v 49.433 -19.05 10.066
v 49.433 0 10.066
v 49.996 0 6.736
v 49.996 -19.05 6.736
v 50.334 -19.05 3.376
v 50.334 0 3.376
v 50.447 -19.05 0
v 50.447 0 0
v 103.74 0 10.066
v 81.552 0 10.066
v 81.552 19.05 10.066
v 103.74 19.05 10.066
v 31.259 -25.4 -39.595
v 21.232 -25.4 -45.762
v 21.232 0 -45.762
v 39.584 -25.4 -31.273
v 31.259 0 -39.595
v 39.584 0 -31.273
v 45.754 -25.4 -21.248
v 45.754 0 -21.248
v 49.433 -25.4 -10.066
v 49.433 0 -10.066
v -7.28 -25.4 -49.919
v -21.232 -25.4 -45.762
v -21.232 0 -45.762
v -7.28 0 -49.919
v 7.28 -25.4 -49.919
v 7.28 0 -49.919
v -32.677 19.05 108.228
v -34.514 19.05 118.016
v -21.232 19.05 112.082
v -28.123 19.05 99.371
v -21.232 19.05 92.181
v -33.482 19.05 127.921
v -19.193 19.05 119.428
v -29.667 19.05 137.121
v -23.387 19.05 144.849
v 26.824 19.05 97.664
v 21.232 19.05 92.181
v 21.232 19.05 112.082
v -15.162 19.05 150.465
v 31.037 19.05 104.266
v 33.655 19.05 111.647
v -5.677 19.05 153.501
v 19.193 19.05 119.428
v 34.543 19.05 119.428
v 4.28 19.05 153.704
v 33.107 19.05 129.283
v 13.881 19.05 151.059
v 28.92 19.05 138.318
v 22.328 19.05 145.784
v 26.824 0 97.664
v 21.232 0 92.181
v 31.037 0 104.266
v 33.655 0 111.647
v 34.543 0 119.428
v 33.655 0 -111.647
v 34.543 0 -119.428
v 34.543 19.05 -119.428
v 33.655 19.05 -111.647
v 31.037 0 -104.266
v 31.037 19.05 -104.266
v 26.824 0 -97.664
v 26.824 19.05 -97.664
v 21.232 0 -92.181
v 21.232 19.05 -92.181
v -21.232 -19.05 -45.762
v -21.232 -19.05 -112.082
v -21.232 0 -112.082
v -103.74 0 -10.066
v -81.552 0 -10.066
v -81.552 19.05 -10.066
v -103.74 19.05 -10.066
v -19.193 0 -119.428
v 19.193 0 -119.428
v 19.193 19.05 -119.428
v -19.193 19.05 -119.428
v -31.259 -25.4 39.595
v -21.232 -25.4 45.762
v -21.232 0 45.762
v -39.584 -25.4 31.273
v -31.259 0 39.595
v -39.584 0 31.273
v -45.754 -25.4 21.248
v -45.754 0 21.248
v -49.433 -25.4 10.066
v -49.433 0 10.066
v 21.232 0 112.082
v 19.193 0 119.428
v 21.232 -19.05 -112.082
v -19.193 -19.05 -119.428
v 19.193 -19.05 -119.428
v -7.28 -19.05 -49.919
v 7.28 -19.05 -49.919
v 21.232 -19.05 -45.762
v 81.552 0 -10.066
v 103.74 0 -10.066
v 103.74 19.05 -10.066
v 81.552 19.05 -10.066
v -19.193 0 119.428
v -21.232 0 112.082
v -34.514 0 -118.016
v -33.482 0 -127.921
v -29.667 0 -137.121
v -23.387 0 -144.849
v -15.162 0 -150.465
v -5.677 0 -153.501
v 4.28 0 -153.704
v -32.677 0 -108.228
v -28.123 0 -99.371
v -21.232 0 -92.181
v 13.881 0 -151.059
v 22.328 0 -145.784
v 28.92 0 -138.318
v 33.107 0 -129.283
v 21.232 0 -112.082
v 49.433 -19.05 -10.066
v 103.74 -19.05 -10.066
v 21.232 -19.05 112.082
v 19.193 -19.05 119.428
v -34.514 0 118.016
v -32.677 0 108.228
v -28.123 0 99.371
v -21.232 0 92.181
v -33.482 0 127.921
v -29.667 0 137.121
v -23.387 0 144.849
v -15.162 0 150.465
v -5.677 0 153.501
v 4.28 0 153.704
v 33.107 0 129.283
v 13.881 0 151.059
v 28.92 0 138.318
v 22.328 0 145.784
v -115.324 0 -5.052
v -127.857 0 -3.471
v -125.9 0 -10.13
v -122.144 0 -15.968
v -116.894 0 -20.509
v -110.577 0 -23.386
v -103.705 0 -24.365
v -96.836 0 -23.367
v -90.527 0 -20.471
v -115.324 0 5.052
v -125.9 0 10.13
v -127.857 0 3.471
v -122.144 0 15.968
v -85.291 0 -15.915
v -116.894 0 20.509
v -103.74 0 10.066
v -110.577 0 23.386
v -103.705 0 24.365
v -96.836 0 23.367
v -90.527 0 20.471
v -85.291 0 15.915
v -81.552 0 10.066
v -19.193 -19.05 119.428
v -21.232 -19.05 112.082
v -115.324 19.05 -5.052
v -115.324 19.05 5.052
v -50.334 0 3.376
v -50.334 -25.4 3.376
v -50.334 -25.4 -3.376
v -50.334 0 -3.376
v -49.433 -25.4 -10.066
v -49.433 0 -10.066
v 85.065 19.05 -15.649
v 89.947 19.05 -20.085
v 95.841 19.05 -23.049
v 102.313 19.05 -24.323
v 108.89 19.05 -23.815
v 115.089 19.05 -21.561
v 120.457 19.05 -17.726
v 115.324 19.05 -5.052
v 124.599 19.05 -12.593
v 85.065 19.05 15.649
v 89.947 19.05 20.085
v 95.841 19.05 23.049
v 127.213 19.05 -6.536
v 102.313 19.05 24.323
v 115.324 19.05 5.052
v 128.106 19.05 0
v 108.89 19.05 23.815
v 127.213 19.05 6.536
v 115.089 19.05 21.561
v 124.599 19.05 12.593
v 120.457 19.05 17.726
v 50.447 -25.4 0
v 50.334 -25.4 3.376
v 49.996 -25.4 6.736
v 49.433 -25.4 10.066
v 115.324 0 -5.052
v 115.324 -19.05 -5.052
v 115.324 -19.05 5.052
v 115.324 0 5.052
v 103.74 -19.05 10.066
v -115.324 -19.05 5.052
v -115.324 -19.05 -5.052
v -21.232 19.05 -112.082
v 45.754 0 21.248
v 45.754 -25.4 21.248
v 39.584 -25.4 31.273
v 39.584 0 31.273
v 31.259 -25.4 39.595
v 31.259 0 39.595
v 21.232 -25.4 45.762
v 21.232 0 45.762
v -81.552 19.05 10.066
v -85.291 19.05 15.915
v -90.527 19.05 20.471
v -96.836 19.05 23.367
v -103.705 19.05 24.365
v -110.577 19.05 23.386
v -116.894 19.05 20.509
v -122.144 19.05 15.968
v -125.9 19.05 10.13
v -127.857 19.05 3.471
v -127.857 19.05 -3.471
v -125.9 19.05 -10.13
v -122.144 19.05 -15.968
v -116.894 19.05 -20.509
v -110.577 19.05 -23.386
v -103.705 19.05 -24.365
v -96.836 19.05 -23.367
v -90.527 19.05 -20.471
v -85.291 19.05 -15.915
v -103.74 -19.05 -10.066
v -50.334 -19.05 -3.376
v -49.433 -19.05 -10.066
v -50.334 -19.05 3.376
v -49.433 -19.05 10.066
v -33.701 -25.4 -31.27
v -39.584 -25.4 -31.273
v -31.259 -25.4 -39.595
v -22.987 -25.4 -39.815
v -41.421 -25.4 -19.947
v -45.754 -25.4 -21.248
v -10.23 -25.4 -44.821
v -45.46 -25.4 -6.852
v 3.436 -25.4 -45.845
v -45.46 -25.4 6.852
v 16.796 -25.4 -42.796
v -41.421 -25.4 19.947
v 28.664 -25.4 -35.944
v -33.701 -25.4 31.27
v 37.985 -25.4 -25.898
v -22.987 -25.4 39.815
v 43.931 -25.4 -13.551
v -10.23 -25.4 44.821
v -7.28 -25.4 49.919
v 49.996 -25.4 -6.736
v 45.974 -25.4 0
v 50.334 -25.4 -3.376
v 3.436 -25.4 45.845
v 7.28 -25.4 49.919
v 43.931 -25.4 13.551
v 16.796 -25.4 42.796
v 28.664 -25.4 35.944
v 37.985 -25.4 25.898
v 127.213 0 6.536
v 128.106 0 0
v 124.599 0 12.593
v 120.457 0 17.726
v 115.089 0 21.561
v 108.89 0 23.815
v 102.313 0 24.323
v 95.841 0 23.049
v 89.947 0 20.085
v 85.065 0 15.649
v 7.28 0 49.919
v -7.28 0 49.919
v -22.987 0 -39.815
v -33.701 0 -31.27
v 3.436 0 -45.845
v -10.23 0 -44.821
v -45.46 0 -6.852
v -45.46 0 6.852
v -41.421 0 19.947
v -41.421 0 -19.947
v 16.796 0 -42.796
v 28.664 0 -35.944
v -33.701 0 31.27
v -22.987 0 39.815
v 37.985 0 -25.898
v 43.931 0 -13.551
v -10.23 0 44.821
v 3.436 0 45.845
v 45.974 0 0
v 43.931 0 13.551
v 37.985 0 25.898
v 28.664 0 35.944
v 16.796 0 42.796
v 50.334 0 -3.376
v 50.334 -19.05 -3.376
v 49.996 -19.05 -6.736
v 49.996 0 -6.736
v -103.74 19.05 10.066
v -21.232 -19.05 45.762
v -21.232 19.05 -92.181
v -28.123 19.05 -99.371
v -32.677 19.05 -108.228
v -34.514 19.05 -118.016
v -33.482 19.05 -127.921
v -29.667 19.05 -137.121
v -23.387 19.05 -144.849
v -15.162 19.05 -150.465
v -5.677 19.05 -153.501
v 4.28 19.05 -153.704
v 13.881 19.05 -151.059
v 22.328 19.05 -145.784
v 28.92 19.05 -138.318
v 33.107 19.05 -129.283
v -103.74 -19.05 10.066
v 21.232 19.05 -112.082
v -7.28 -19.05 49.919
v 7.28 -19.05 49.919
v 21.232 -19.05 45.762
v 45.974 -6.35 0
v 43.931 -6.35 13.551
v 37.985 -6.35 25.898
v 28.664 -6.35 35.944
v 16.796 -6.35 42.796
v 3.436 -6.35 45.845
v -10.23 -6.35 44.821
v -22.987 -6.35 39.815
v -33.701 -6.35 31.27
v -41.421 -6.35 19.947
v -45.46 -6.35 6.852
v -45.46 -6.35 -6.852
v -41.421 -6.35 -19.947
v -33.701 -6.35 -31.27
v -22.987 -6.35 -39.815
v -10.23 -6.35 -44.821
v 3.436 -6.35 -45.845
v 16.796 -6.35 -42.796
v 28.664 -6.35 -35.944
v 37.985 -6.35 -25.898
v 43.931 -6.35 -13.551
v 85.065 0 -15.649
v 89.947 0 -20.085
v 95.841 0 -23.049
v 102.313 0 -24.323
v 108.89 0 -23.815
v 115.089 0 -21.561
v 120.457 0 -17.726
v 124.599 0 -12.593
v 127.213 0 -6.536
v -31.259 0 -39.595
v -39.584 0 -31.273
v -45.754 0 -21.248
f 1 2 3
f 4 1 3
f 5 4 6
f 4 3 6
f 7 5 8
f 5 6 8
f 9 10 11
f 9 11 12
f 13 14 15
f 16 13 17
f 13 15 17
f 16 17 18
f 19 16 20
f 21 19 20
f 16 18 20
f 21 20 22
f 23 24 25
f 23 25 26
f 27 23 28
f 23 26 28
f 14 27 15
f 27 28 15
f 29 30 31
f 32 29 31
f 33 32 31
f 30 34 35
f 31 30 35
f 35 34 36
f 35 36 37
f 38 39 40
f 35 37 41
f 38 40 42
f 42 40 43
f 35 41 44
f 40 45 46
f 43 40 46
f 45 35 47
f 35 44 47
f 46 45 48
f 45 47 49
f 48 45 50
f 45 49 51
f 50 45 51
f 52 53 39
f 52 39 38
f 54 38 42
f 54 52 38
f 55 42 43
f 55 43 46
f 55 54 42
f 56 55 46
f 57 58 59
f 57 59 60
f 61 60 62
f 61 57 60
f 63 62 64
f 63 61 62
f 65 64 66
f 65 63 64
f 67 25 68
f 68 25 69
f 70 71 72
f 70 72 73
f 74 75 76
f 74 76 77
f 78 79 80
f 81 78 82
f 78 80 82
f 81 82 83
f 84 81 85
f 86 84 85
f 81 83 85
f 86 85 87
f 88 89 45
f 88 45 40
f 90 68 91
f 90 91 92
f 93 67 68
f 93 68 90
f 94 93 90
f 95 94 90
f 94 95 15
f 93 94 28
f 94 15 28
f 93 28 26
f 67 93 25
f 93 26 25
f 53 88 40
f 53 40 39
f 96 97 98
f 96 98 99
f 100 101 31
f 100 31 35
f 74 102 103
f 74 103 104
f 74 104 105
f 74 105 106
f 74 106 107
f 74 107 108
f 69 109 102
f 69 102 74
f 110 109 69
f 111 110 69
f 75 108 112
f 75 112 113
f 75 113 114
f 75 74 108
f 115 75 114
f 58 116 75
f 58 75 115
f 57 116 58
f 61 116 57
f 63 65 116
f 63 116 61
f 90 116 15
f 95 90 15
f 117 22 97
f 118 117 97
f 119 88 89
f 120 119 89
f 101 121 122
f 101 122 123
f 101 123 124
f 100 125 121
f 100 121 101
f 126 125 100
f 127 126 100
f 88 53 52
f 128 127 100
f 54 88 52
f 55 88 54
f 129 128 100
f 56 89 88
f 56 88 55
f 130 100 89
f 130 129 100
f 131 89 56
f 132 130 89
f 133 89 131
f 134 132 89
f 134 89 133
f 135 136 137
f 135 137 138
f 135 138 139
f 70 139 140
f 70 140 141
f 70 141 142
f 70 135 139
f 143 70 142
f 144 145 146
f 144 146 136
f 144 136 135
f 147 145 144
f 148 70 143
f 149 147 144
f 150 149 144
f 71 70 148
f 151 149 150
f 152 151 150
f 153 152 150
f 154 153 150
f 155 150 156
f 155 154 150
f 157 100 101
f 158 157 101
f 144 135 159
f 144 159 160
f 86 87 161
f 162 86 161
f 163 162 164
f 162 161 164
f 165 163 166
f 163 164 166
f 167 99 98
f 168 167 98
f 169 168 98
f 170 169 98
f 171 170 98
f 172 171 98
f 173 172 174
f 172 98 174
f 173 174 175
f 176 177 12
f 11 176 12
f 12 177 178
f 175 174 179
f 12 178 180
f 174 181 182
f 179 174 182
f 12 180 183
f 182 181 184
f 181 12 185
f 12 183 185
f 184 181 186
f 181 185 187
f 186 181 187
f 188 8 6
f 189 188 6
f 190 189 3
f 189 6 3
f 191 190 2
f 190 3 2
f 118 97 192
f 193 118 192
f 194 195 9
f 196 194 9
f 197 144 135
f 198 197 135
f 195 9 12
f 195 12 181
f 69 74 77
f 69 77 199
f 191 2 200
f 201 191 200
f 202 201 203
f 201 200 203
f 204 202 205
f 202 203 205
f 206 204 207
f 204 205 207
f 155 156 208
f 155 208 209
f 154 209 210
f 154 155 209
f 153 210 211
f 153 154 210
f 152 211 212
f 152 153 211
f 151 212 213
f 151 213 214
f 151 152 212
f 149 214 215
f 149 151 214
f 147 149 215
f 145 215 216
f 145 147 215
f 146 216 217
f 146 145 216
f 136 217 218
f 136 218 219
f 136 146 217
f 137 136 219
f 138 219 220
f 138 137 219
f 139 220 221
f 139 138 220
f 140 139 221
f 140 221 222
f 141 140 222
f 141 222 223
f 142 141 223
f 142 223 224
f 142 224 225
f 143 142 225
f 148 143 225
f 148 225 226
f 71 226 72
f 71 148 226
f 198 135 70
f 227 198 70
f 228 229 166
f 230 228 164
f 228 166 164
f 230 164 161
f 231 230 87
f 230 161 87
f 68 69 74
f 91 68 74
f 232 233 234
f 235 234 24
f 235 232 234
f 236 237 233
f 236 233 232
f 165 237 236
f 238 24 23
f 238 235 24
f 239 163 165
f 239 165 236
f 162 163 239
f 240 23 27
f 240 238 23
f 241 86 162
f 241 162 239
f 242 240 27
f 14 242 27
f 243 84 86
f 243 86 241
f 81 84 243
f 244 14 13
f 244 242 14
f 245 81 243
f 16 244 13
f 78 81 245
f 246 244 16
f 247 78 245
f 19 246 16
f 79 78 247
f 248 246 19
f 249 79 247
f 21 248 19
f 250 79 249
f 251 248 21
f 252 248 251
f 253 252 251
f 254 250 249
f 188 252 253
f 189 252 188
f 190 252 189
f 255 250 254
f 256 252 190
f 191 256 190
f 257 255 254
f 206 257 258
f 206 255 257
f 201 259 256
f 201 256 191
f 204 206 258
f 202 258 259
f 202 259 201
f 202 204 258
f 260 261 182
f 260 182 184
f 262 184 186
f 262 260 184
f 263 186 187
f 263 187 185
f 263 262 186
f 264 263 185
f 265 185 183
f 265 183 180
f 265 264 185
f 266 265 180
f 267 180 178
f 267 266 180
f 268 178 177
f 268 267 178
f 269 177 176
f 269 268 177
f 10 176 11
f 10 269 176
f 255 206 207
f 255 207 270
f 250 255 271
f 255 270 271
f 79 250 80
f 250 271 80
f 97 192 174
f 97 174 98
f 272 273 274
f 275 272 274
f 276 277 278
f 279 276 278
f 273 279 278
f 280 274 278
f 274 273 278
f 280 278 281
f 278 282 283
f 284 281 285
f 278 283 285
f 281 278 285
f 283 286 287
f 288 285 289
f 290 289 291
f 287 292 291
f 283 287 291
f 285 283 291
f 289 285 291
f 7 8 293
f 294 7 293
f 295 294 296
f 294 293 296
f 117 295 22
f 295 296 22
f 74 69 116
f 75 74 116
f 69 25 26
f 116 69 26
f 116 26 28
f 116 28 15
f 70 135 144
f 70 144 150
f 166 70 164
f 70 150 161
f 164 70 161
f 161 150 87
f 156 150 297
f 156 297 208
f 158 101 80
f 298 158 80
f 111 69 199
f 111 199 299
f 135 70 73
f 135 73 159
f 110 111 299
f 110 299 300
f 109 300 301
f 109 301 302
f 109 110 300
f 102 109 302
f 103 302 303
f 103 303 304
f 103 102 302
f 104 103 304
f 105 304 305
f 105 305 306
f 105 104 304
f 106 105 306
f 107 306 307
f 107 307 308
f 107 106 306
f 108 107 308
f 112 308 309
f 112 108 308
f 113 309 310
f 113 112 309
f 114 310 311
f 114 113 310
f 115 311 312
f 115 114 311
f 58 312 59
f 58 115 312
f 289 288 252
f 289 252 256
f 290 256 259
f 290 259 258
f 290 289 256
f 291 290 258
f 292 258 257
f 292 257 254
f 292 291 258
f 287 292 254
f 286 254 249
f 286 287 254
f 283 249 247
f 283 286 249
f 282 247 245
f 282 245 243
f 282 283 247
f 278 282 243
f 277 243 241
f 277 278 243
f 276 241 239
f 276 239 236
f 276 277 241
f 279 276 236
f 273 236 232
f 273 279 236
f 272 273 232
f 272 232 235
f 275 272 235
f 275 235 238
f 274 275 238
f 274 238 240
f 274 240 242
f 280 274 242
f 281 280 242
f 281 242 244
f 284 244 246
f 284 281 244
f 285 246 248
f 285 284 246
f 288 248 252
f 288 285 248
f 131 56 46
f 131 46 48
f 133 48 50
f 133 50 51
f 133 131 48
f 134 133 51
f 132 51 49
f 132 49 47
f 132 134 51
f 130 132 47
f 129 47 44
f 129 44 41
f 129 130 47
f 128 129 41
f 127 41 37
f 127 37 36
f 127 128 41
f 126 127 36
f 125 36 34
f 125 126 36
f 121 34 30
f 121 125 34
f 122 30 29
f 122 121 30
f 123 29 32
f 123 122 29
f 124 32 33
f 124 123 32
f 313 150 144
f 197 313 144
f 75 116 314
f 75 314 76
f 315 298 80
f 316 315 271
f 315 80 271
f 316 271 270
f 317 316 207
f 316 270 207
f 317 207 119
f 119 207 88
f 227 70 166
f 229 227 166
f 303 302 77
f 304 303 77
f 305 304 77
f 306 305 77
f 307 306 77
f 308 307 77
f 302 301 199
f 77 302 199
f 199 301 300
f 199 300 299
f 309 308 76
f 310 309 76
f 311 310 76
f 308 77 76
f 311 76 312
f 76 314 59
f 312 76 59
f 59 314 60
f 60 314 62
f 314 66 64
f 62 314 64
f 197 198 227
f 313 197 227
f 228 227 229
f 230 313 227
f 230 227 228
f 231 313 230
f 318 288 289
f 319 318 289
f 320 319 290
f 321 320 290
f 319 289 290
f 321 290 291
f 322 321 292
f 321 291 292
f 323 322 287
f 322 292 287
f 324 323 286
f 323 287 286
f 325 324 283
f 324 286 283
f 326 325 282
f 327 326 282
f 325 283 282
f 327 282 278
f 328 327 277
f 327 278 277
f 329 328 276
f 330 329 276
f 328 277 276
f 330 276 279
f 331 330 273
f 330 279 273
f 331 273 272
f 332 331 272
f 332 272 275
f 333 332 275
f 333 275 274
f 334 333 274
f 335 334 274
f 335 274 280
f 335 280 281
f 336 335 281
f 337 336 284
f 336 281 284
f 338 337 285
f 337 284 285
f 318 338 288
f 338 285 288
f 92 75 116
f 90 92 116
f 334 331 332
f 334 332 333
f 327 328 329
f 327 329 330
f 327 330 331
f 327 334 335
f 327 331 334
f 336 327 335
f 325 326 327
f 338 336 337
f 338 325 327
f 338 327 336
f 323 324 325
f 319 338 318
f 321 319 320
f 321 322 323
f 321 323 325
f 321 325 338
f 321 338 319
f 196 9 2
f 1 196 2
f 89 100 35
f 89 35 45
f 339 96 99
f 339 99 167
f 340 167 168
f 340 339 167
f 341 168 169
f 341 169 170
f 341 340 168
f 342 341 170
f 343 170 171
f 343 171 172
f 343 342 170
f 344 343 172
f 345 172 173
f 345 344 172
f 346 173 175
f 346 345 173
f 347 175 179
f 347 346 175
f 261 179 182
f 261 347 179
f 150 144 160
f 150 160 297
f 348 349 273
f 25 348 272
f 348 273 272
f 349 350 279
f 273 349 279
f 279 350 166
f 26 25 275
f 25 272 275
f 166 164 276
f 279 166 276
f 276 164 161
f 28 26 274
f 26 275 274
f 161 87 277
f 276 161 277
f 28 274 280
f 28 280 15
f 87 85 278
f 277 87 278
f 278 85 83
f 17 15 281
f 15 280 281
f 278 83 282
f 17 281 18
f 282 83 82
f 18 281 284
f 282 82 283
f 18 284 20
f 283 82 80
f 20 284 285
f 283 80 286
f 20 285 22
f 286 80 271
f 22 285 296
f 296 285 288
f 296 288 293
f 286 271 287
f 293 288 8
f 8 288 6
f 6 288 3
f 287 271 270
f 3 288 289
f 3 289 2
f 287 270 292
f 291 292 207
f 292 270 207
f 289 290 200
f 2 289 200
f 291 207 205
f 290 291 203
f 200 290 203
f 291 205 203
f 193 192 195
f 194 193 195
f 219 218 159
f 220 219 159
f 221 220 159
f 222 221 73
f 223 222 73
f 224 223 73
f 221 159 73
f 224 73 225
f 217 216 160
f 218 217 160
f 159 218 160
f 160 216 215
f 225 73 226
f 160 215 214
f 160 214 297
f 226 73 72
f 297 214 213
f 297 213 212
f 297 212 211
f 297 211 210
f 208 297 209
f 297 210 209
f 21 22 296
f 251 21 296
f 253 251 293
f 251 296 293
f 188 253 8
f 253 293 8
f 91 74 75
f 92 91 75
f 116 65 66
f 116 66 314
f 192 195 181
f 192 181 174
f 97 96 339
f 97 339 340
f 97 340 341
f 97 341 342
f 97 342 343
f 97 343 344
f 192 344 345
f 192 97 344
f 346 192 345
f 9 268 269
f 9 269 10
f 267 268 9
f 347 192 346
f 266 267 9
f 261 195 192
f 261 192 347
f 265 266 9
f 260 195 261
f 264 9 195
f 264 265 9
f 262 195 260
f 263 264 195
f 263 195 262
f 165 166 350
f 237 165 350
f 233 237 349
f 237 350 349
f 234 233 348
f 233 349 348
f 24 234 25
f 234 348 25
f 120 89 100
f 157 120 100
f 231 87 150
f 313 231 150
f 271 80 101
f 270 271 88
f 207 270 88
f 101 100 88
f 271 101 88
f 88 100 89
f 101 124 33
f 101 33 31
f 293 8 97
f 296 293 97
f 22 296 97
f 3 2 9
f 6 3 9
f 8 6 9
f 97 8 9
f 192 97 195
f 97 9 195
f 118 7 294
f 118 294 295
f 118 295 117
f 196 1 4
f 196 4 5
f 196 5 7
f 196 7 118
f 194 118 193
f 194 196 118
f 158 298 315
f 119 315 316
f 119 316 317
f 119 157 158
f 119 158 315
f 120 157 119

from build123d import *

# Parameters (mm, degrees)
F0_R     = 45.9739525872
F1_DEPTH = 6.35
F2_DEPTH = 25.4
F3_DEPTH = 19.05
F4_DEPTH = 19.05


with BuildPart() as f1:
    # F0 (on Front) → F1 (new body)
    with BuildSketch(Plane.XZ):
        Circle(F0_R)
    extrude(amount=F1_DEPTH)


with BuildPart() as f2:
    # F0 (on Front) → F2 (new body)
    with BuildSketch(Plane.XZ):
        with BuildLine():
            ThreePointArc((49.4328212787, -10.0663737277), (50.1930812917, -5.0586846158), (50.4473557245, 0))
            ThreePointArc((50.4473557245, 0), (50.1930812917, 5.0586846158), (49.4328212787, 10.0663737277))
            ThreePointArc((49.4328212787, 10.0663737277), (39.5844821809, 31.2730630106), (21.2324433808, 45.7615455124))
            ThreePointArc((21.2324433808, 45.7615455124), (0, 50.4473557245), (-21.2324433808, 45.7615455124))
            ThreePointArc((-21.2324433808, 45.7615455124), (-39.5844821809, 31.2730630106), (-49.4328212787, 10.0663737277))
            ThreePointArc((-49.4328212787, 10.0663737277), (-50.4473557245, 0), (-49.4328212787, -10.0663737277))
            ThreePointArc((-49.4328212787, -10.0663737277), (-39.5844821809, -31.2730630106), (-21.2324433808, -45.7615455124))
            ThreePointArc((-21.2324433808, -45.7615455124), (0, -50.4473557245), (21.2324433808, -45.7615455124))
            ThreePointArc((21.2324433808, -45.7615455124), (39.5844821809, -31.2730630106), (49.4328212787, -10.0663737277))
        make_face()
        Circle(F0_R, mode=Mode.SUBTRACT)
    extrude(amount=F2_DEPTH)


with BuildPart() as f3:
    # F0 (on Front) → F3 (new body)
    with BuildSketch(Plane.XZ):
        with BuildLine():
            ThreePointArc((-79.3750054435, 0), (-79.9253862812, 5.1495078004), (-81.5516639655, 10.0663737277))
            Line((-81.5516639655, 10.0663737277), (-103.7402702002, 10.0663737277))
            Line((-103.7402702002, 10.0663737277), (-115.3241221478, 5.0522867017))
            Line((-115.3241221478, 5.0522867017), (-115.3241221478, -5.0522867017))
            Line((-115.3241221478, -5.0522867017), (-103.7402702002, -10.0663737277))
            Line((-103.7402702002, -10.0663737277), (-81.5516639655, -10.0663737277))
            ThreePointArc((-81.5516639655, -10.0663737277), (-79.9253862812, -5.1495078004), (-79.3750054435, 0))
        make_face()
        with BuildLine():
            ThreePointArc((-49.4328212787, -10.0663737277), (-50.4473557245, 0), (-49.4328212787, 10.0663737277))
            Line((-49.4328212787, 10.0663737277), (-81.5516639655, 10.0663737277))
            ThreePointArc((-81.5516639655, 10.0663737277), (-79.9253862812, 5.1495078004), (-79.3750054435, 0))
            ThreePointArc((-79.3750054435, 0), (-79.9253862812, -5.1495078004), (-81.5516639655, -10.0663737277))
            Line((-81.5516639655, -10.0663737277), (-49.4328212787, -10.0663737277))
        make_face()
    extrude(amount=F3_DEPTH)


with BuildPart() as f3b:
    # F0 (on Front) → F3, piece 2 (new body)
    with BuildSketch(Plane.XZ):
        with BuildLine():
            ThreePointArc((49.4328212787, 10.0663737277), (50.1930812917, 5.0586846158), (50.4473557245, 0))
            ThreePointArc((50.4473557245, 0), (50.1930812917, -5.0586846158), (49.4328212787, -10.0663737277))
            Line((49.4328212787, -10.0663737277), (81.5516639655, -10.0663737277))
            ThreePointArc((81.5516639655, -10.0663737277), (79.3750054435, 0), (81.5516639655, 10.0663737277))
            Line((81.5516639655, 10.0663737277), (49.4328212787, 10.0663737277))
        make_face()
        with BuildLine():
            Line((103.7402702002, 10.0663737277), (81.5516639655, 10.0663737277))
            ThreePointArc((81.5516639655, 10.0663737277), (79.3750054435, 0), (81.5516639655, -10.0663737277))
            Line((81.5516639655, -10.0663737277), (103.7402702002, -10.0663737277))
            Line((103.7402702002, -10.0663737277), (115.3241221478, -5.0522867017))
            Line((115.3241221478, -5.0522867017), (115.3241221478, 5.0522867017))
            Line((115.3241221478, 5.0522867017), (103.7402702002, 10.0663737277))
        make_face()
    extrude(amount=F3_DEPTH)


with BuildPart() as f3c:
    # F0 (on Front) → F3, piece 3 (new body)
    with BuildSketch(Plane.XZ):
        with BuildLine():
            ThreePointArc((-21.2324433808, 45.7615455124), (0, 50.4473557245), (21.2324433808, 45.7615455124))
            Line((21.2324433808, 45.7615455124), (21.2324433808, 92.1809940965))
            ThreePointArc((21.2324433808, 92.1809940965), (0, 84.8849892461), (-21.2324433808, 92.1809940965))
            Line((-21.2324433808, 92.1809940965), (-21.2324433808, 45.7615455124))
        make_face()
        with BuildLine():
            ThreePointArc((-21.2324433808, 92.1809940965), (0, 84.8849892461), (21.2324433808, 92.1809940965))
            Line((21.2324433808, 92.1809940965), (21.2324433808, 112.0817683699))
            Line((21.2324433808, 112.0817683699), (19.1925481176, 119.4277526507))
            Line((19.1925481176, 119.4277526507), (0, 119.4277526507))
            Line((0, 119.4277526507), (-19.1925481176, 119.4277526507))
            Line((-19.1925481176, 119.4277526507), (-21.2324433808, 112.0817683699))
            Line((-21.2324433808, 112.0817683699), (-21.2324433808, 92.1809940965))
        make_face()
    extrude(amount=F3_DEPTH)


with BuildPart() as f3d:
    # F0 (on Front) → F3, piece 4 (new body)
    with BuildSketch(Plane.XZ):
        with BuildLine():
            Line((21.2324433808, -92.1809940965), (21.2324433808, -45.7615455124))
            ThreePointArc((21.2324433808, -45.7615455124), (0, -50.4473557245), (-21.2324433808, -45.7615455124))
            Line((-21.2324433808, -45.7615455124), (-21.2324433808, -92.1809940965))
            ThreePointArc((-21.2324433808, -92.1809940965), (0, -84.8849892461), (21.2324433808, -92.1809940965))
        make_face()
        with BuildLine():
            Line((21.2324433808, -112.0817683699), (21.2324433808, -92.1809940965))
            ThreePointArc((21.2324433808, -92.1809940965), (0, -84.8849892461), (-21.2324433808, -92.1809940965))
            Line((-21.2324433808, -92.1809940965), (-21.2324433808, -112.0817683699))
            Line((-21.2324433808, -112.0817683699), (-19.1925481176, -119.4277526507))
            Line((-19.1925481176, -119.4277526507), (0, -119.4277526507))
            Line((0, -119.4277526507), (19.1925481176, -119.4277526507))
            Line((19.1925481176, -119.4277526507), (21.2324433808, -112.0817683699))
        make_face()
    extrude(amount=F3_DEPTH)


with BuildPart() as f4:
    # F0 (on Front) → F4 (new body)
    with BuildSketch(Plane.XZ):
        with BuildLine():
            Line((21.2324433808, 112.0817683699), (21.2324433808, 92.1809940965))
            ThreePointArc((21.2324433808, 92.1809940965), (31.0373144121, 104.2657073496), (34.5427634046, 119.4277526507))
            ThreePointArc((34.5427634046, 119.4277526507), (-15.1620453011, 150.4650670629), (-21.2324433808, 92.1809940965))
            Line((-21.2324433808, 92.1809940965), (-21.2324433808, 112.0817683699))
            Line((-21.2324433808, 112.0817683699), (-19.1925481176, 119.4277526507))
            Line((-19.1925481176, 119.4277526507), (0, 119.4277526507))
            Line((0, 119.4277526507), (19.1925481176, 119.4277526507))
            Line((19.1925481176, 119.4277526507), (21.2324433808, 112.0817683699))
        make_face()
    extrude(amount=-F4_DEPTH)


with BuildPart() as f4b:
    # F0 (on Front) → F4, piece 2 (new body)
    with BuildSketch(Plane.XZ):
        with BuildLine():
            ThreePointArc((34.5427634046, -119.4277526507), (31.0373144121, -104.2657073496), (21.2324433808, -92.1809940965))
            Line((21.2324433808, -92.1809940965), (21.2324433808, -112.0817683699))
            Line((21.2324433808, -112.0817683699), (19.1925481176, -119.4277526507))
            Line((19.1925481176, -119.4277526507), (0, -119.4277526507))
            Line((0, -119.4277526507), (-19.1925481176, -119.4277526507))
            Line((-19.1925481176, -119.4277526507), (-21.2324433808, -112.0817683699))
            Line((-21.2324433808, -112.0817683699), (-21.2324433808, -92.1809940965))
            ThreePointArc((-21.2324433808, -92.1809940965), (-15.1620453011, -150.4650670629), (34.5427634046, -119.4277526507))
        make_face()
    extrude(amount=-F4_DEPTH)


with BuildPart() as f4c:
    # F0 (on Front) → F4, piece 3 (new body)
    with BuildSketch(Plane.XZ):
        with BuildLine():
            Line((-103.7402702002, 10.0663737277), (-81.5516639655, 10.0663737277))
            ThreePointArc((-81.5516639655, 10.0663737277), (-128.1055349569, 0), (-81.5516639655, -10.0663737277))
            Line((-81.5516639655, -10.0663737277), (-103.7402702002, -10.0663737277))
            Line((-103.7402702002, -10.0663737277), (-115.3241221478, -5.0522867017))
            Line((-115.3241221478, -5.0522867017), (-115.3241221478, 5.0522867017))
            Line((-115.3241221478, 5.0522867017), (-103.7402702002, 10.0663737277))
        make_face()
    extrude(amount=-F4_DEPTH)


with BuildPart() as f4d:
    # F0 (on Front) → F4, piece 4 (new body)
    with BuildSketch(Plane.XZ):
        with BuildLine():
            ThreePointArc((128.1055349569, 0), (108.8897780006, 23.814883919), (81.5516639655, 10.0663737277))
            Line((81.5516639655, 10.0663737277), (103.7402702002, 10.0663737277))
            Line((103.7402702002, 10.0663737277), (115.3241221478, 5.0522867017))
            Line((115.3241221478, 5.0522867017), (115.3241221478, -5.0522867017))
            Line((115.3241221478, -5.0522867017), (103.7402702002, -10.0663737277))
            Line((103.7402702002, -10.0663737277), (81.5516639655, -10.0663737277))
            ThreePointArc((81.5516639655, -10.0663737277), (108.8897780006, -23.814883919), (128.1055349569, 0))
        make_face()
    extrude(amount=-F4_DEPTH)


solid = Compound([f1.part, f2.part, f3.part, f3b.part, f3c.part, f3d.part, f4.part, f4b.part, f4c.part, f4d.part])
